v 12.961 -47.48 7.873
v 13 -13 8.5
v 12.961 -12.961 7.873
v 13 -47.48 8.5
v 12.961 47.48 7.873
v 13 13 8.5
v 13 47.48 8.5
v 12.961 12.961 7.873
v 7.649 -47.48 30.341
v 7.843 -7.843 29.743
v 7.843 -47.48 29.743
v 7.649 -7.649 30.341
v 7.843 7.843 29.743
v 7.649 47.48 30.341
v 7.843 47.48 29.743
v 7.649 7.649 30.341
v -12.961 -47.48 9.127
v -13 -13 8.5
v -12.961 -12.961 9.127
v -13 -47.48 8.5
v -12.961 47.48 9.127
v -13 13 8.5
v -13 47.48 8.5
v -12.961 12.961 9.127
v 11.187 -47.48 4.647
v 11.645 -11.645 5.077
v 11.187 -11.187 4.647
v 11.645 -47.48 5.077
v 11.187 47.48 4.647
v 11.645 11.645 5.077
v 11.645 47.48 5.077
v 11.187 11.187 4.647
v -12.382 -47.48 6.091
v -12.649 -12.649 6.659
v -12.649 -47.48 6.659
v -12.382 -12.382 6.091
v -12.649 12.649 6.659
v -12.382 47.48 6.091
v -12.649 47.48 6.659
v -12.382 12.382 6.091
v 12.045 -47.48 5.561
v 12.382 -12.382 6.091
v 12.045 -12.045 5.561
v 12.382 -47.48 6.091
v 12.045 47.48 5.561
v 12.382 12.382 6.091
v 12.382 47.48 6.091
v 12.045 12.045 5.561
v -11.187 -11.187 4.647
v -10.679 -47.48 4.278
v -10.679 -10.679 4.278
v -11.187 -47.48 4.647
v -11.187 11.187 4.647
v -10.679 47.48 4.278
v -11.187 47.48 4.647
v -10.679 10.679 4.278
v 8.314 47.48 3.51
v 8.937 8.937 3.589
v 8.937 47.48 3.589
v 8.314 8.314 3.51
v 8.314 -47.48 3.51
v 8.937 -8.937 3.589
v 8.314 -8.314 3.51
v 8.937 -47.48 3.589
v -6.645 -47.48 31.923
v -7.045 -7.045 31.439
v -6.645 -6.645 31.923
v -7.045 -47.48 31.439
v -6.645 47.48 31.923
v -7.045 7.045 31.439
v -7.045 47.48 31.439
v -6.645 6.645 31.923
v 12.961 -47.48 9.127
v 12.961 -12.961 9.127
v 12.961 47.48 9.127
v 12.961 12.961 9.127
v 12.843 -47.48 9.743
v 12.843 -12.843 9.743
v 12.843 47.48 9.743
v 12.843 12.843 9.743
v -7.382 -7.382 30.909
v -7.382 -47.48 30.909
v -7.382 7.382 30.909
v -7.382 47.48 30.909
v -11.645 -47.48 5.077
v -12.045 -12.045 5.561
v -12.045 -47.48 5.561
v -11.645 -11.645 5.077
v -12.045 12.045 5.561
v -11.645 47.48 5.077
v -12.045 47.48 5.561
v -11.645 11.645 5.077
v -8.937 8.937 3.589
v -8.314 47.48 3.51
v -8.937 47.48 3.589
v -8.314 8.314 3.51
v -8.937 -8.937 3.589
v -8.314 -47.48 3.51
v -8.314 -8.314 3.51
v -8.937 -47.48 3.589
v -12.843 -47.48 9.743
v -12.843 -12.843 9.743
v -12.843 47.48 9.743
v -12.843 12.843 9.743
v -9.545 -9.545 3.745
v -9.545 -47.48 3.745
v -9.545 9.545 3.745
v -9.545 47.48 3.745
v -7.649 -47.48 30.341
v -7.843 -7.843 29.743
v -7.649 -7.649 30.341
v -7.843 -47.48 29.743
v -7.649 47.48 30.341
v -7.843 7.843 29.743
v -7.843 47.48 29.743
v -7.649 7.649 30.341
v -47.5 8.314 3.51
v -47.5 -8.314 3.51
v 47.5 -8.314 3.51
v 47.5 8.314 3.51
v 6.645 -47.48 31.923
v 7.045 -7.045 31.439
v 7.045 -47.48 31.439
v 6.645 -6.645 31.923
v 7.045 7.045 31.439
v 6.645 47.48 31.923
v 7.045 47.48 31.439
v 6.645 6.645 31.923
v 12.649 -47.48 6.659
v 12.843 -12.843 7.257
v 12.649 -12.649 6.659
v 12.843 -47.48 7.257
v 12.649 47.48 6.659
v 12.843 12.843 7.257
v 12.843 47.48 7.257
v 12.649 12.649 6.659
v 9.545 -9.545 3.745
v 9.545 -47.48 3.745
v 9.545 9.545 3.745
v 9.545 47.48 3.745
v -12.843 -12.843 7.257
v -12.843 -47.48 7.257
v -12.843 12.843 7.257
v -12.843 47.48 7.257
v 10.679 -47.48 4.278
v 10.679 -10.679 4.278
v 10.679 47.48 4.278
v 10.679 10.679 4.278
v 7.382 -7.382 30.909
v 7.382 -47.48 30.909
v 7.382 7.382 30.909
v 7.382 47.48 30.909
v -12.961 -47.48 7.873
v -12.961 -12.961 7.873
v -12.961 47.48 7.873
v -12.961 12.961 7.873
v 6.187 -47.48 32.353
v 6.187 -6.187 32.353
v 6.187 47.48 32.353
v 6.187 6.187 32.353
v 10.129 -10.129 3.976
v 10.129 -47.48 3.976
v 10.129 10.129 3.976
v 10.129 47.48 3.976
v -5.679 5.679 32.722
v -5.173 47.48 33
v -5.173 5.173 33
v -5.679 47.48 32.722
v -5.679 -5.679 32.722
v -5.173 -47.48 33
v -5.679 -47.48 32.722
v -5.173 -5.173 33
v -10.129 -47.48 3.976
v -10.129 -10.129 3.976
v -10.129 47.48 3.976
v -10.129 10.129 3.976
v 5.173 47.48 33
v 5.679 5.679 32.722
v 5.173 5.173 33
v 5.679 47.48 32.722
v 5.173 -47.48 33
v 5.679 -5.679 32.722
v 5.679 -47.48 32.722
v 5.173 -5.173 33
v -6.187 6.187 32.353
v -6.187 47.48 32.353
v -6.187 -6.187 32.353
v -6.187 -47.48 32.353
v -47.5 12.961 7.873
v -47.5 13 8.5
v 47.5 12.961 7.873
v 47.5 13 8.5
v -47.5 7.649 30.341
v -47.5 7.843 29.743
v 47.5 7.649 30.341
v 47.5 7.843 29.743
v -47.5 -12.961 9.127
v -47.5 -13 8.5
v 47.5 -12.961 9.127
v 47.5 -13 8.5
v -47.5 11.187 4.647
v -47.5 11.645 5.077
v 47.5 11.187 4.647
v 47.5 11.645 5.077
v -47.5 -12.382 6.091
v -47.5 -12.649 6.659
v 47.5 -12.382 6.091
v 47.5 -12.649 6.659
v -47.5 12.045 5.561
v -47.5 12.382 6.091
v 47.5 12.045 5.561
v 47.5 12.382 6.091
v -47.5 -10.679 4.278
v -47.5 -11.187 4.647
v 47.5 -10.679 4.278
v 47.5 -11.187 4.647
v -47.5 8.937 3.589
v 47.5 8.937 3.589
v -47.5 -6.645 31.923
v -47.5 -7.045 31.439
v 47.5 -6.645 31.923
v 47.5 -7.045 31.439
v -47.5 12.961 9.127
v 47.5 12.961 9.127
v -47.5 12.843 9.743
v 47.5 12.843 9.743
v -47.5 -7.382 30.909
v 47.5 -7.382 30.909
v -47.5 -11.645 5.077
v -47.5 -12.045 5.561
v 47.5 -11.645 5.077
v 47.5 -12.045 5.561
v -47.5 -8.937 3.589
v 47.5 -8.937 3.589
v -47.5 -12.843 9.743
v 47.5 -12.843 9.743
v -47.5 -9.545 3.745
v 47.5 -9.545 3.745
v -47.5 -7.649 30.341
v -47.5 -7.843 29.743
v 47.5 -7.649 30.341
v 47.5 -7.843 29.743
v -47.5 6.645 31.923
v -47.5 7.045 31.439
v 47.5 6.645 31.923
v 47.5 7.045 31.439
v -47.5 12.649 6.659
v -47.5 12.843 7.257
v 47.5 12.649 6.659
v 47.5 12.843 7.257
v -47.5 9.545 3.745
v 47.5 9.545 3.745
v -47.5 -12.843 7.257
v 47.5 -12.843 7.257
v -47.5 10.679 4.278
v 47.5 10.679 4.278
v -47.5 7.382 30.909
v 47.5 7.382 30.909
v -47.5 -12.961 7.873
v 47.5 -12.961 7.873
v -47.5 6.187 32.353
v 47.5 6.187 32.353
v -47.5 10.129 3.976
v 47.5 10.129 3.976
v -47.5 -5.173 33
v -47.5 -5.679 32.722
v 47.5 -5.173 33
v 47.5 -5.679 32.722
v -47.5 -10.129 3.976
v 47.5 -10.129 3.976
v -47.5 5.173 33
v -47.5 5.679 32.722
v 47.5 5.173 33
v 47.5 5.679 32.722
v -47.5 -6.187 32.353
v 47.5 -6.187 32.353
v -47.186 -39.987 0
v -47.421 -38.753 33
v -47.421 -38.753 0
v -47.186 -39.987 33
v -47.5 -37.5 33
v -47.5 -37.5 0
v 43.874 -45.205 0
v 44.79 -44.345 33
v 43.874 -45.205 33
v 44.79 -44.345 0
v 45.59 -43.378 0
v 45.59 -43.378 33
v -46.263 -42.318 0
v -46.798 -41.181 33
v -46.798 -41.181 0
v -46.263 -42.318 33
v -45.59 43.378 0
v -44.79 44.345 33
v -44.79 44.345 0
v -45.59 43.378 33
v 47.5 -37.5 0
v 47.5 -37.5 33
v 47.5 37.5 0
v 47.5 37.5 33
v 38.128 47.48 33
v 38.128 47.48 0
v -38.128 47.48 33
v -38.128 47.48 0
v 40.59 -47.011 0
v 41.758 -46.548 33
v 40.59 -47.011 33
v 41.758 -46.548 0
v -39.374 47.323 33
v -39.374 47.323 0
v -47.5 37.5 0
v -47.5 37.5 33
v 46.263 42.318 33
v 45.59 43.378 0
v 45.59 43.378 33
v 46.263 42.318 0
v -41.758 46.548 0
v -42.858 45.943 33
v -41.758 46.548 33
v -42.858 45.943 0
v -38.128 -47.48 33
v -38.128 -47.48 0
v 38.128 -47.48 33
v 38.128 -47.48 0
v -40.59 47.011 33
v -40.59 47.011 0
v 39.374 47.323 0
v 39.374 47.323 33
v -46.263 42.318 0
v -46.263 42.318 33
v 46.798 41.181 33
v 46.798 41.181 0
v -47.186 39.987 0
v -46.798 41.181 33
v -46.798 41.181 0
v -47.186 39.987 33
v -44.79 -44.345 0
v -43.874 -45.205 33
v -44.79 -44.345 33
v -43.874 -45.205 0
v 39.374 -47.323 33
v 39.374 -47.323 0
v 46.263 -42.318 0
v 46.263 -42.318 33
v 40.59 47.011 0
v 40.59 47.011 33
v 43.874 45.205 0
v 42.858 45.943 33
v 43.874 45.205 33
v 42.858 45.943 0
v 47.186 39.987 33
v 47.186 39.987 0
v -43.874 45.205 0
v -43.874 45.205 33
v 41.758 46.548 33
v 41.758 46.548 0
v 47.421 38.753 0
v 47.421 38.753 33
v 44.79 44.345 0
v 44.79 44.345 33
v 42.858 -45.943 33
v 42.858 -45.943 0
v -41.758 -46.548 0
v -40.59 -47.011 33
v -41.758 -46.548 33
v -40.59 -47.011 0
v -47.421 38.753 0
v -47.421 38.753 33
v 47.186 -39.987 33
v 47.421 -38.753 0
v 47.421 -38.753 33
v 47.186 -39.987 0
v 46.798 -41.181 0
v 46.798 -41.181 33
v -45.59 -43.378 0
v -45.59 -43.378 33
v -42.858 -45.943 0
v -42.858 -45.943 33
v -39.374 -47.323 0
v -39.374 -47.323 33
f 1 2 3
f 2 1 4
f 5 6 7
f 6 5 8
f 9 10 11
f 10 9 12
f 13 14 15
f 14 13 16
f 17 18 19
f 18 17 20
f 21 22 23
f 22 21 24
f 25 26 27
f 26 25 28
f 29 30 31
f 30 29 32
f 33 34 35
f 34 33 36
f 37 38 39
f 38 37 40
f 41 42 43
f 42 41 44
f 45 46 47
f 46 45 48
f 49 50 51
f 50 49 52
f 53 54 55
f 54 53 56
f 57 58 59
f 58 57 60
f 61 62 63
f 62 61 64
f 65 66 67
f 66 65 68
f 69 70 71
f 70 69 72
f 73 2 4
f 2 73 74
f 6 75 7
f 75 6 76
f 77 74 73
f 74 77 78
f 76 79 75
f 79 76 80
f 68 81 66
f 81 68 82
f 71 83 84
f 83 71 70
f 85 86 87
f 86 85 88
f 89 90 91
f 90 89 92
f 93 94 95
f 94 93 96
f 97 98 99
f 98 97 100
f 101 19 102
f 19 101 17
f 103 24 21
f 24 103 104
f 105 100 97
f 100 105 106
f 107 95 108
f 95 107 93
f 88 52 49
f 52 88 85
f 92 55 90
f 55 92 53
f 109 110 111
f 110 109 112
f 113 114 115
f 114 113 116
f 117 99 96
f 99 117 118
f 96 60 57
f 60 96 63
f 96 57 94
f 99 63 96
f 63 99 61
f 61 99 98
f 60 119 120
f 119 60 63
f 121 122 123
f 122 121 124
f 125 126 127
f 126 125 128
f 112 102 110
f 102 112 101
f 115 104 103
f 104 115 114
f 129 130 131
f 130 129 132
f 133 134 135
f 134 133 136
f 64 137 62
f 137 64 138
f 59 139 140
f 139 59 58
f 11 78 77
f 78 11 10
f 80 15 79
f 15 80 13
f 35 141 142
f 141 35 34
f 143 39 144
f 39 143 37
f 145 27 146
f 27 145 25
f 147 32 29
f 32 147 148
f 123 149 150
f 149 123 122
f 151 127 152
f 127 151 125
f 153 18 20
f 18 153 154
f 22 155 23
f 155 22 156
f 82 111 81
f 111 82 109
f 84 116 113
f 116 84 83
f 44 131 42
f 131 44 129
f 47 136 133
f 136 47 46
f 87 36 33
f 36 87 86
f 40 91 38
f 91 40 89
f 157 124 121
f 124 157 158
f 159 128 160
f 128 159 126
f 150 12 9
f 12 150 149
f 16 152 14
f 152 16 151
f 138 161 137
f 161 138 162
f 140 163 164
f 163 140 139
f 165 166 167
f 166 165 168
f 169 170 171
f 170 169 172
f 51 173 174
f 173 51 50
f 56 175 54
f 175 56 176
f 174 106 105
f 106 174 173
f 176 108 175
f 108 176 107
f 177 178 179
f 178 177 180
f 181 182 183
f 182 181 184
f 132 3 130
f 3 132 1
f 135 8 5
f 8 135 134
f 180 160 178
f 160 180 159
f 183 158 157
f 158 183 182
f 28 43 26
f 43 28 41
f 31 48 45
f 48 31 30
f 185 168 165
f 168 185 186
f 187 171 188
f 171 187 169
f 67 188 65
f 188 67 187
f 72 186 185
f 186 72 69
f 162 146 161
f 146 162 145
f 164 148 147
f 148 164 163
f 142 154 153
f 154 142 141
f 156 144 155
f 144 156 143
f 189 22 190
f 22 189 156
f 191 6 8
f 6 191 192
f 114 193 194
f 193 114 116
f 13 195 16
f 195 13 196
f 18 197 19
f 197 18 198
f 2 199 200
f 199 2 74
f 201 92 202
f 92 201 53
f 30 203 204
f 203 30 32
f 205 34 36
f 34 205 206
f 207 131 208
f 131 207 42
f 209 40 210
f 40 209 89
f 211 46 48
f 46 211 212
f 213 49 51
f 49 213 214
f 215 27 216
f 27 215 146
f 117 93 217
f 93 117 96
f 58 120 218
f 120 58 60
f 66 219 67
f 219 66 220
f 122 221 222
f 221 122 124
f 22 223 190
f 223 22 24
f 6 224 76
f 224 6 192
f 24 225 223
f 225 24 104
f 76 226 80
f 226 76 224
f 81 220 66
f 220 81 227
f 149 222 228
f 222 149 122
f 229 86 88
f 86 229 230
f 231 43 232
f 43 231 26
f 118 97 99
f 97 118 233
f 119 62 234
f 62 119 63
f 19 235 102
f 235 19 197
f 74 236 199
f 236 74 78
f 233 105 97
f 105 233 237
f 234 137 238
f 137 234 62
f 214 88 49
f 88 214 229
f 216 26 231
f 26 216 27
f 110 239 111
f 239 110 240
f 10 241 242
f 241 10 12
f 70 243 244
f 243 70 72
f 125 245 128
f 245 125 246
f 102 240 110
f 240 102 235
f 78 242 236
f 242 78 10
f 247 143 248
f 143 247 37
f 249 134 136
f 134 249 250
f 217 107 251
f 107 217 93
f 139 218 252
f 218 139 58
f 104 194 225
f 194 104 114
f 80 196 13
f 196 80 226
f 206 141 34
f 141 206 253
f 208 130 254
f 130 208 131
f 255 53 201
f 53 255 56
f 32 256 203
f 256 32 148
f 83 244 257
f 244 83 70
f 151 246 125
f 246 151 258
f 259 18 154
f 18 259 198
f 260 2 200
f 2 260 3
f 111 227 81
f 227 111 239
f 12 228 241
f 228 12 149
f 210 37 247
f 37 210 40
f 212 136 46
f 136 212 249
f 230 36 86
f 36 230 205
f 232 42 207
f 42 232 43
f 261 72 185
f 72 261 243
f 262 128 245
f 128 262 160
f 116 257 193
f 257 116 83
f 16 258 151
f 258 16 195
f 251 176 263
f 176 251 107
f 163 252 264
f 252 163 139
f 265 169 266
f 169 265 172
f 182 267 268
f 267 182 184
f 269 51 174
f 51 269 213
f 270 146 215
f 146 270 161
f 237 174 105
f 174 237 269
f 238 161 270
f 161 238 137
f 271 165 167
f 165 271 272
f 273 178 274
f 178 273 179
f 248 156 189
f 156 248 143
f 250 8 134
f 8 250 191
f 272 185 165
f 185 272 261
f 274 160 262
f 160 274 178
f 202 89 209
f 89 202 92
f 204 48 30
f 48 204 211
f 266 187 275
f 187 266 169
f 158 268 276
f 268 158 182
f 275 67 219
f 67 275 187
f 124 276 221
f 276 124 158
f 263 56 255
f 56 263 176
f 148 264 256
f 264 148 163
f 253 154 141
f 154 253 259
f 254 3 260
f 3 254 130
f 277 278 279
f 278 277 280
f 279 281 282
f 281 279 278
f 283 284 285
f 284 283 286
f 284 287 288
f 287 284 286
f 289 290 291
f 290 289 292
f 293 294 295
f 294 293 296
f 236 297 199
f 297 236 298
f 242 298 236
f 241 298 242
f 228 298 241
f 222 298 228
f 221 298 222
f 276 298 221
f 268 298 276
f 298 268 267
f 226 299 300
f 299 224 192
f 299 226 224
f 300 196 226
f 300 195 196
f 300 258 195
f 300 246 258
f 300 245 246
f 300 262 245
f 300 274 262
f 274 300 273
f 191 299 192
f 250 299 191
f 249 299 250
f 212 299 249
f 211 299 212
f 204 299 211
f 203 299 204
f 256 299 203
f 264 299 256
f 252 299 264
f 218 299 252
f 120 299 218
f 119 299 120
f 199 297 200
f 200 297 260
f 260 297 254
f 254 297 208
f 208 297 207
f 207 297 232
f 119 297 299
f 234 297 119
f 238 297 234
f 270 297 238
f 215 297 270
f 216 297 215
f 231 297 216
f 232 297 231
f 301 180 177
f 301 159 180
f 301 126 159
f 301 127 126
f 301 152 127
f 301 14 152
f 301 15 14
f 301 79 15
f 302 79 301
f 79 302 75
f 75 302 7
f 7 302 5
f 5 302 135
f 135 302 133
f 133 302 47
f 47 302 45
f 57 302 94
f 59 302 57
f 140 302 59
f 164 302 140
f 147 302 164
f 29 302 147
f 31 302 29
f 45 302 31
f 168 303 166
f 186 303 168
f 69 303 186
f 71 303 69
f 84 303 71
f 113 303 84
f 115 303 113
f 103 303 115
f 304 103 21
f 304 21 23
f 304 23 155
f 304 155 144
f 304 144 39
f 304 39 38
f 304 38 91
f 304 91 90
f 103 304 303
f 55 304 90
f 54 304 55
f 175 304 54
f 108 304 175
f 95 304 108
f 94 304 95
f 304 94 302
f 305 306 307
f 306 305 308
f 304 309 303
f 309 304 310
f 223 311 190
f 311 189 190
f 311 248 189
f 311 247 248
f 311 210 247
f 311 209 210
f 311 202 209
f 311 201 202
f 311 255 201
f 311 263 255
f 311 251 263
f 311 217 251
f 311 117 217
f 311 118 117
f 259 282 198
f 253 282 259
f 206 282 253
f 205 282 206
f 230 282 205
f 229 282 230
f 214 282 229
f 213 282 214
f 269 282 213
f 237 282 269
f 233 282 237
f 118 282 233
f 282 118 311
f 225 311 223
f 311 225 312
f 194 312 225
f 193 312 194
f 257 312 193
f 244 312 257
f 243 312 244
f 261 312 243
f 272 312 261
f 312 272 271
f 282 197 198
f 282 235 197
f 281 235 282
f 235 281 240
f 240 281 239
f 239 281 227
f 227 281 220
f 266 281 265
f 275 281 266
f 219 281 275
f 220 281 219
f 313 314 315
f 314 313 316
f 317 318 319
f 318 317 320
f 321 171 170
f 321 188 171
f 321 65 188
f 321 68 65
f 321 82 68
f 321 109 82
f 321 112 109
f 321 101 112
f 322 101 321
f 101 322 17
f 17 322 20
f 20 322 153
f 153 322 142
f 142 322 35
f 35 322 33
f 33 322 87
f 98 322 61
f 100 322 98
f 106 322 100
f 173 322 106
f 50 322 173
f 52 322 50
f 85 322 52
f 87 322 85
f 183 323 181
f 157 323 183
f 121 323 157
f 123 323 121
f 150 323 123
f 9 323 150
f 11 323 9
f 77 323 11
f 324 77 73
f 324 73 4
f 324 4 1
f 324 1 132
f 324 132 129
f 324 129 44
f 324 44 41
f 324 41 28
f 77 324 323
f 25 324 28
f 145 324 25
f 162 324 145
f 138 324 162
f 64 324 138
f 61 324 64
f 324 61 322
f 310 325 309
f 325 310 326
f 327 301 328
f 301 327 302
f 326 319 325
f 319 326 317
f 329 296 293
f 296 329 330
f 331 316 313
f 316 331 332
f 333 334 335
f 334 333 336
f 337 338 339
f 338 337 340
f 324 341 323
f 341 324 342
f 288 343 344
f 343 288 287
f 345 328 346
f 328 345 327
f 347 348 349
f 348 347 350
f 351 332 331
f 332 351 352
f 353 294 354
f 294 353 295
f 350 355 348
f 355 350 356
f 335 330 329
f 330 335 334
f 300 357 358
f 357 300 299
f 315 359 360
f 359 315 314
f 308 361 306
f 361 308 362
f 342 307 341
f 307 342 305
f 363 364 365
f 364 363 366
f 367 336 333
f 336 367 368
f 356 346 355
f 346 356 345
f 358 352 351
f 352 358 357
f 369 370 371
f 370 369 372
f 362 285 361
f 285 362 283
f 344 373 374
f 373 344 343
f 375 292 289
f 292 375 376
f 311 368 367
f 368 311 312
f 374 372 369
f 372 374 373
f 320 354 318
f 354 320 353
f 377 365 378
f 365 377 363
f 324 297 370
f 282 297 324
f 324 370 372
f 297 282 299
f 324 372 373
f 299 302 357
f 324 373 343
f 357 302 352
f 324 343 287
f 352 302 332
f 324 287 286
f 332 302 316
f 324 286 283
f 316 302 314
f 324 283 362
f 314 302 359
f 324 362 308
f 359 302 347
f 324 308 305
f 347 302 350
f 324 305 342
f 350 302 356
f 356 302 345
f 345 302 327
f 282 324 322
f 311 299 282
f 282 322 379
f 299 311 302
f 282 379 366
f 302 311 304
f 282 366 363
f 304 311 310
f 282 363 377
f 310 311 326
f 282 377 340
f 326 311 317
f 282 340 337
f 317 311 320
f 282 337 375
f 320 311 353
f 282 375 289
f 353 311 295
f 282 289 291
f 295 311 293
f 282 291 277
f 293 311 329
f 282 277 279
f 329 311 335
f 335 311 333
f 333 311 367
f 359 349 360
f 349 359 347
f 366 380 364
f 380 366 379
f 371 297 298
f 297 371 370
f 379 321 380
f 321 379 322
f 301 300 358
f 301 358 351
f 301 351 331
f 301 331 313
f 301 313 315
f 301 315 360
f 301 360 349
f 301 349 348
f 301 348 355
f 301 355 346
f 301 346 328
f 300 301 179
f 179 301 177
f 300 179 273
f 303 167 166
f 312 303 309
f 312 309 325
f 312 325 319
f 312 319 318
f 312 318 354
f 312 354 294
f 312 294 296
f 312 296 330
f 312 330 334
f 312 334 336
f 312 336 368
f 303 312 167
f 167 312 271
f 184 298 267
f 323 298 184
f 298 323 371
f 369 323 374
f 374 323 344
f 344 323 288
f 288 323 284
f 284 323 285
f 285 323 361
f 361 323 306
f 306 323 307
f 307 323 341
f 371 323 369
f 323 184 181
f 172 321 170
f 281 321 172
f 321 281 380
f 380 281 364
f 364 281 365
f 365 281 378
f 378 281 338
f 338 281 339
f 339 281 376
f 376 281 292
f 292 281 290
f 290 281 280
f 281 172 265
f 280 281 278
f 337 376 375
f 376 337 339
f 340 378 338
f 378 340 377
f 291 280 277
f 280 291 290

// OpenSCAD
// file: slider.scad
/* Author: Antonio Navarro
 * License: LGPLv2.1
 * 
 * This is my desing of a Trammel of Archimedes in OpenSCAD
 * Feel free to modify.
 * 
 * Edit 'config.scad' to change parameters.
 *
 * Slider desing
 *
 */
include <config.scad>

module slider(lenght=slider_lenght, margin=0){

	x1=(top_width/2)-rad_round+margin;
	x2=(down_width/2)-rad_round+margin;
	y=(slider_height/2)-rad_round;
	z=0;

	base = [
		[x1,y,z],
		[x2,-y,z],
		[-x1,y,z],
		[-x2,-y,z]
	];

	translate([0,0,slider_height/2])
		rotate([90,0,0])
			linear_extrude(height=lenght, center=true){
				hull(){
					for(i = [0:3])
						translate(base[i])
							circle(r=rad_round);
				}
			}
	translate([0,0,slider_height-0.1])
		cylinder(d=slider_axe,h=arm_thickness*2);

}

slider();
// file: config.scad
/* Author: Antonio Navarro
 * License: LGPLv2.1
 * 
 * This is my desing of a Trammel of Archimedes in OpenSCAD
 * Feel free to modify.
 *
 * Configuration file
 */

$fn=50;

/****** Slider parameters *****/
slider_height=30;
slider_lenght=30;
top_width=15;
down_width=25;
rad_round=5;
slider_axe=top_width/2;

/****** base parameters *****/
base_lenght=100;
base_thickness=3;
base_rad=10;
base_height=slider_height;

/****** arm parameters *****/
arm_thickness=3;
arm_lenght=base_lenght;
arm_width=top_width;
// main file
/* Author: Antonio Navarro
 * License: LGPLv2.1
 * 
 * This is my desing of a Trammel of Archimedes in OpenSCAD
 * Feel free to modify.
 * 
 * Edit 'config.scad' to change parameters.
 *
 * Base desing
 *
 */

include <config.scad>
use <slider.scad>

$fn=50;

module platform(){

	x=(base_lenght/2)-down_width/2;
	y=(base_lenght/2)-down_width/2;
	z=0;

	base = [
		[x,y,z],
		[x,-y,z],
		[-x,y,z],
		[-x,-y,z]
	];

//	rotate([0,0,45])
		linear_extrude(height=base_thickness+base_height)
			hull(){
				for(i = [0:3])
					translate(base[i])
						circle(r=base_rad);
			}
}

module base(){

	gap=0.5;
	diagonal=base_lenght*2;
	
	difference(){
		platform();
		translate([0,0,base_thickness+gap])
			slider(diagonal,gap);
		rotate([0,0,90])
			translate([0,0,base_thickness+gap])
				slider(diagonal,gap);
	}
}

base();
